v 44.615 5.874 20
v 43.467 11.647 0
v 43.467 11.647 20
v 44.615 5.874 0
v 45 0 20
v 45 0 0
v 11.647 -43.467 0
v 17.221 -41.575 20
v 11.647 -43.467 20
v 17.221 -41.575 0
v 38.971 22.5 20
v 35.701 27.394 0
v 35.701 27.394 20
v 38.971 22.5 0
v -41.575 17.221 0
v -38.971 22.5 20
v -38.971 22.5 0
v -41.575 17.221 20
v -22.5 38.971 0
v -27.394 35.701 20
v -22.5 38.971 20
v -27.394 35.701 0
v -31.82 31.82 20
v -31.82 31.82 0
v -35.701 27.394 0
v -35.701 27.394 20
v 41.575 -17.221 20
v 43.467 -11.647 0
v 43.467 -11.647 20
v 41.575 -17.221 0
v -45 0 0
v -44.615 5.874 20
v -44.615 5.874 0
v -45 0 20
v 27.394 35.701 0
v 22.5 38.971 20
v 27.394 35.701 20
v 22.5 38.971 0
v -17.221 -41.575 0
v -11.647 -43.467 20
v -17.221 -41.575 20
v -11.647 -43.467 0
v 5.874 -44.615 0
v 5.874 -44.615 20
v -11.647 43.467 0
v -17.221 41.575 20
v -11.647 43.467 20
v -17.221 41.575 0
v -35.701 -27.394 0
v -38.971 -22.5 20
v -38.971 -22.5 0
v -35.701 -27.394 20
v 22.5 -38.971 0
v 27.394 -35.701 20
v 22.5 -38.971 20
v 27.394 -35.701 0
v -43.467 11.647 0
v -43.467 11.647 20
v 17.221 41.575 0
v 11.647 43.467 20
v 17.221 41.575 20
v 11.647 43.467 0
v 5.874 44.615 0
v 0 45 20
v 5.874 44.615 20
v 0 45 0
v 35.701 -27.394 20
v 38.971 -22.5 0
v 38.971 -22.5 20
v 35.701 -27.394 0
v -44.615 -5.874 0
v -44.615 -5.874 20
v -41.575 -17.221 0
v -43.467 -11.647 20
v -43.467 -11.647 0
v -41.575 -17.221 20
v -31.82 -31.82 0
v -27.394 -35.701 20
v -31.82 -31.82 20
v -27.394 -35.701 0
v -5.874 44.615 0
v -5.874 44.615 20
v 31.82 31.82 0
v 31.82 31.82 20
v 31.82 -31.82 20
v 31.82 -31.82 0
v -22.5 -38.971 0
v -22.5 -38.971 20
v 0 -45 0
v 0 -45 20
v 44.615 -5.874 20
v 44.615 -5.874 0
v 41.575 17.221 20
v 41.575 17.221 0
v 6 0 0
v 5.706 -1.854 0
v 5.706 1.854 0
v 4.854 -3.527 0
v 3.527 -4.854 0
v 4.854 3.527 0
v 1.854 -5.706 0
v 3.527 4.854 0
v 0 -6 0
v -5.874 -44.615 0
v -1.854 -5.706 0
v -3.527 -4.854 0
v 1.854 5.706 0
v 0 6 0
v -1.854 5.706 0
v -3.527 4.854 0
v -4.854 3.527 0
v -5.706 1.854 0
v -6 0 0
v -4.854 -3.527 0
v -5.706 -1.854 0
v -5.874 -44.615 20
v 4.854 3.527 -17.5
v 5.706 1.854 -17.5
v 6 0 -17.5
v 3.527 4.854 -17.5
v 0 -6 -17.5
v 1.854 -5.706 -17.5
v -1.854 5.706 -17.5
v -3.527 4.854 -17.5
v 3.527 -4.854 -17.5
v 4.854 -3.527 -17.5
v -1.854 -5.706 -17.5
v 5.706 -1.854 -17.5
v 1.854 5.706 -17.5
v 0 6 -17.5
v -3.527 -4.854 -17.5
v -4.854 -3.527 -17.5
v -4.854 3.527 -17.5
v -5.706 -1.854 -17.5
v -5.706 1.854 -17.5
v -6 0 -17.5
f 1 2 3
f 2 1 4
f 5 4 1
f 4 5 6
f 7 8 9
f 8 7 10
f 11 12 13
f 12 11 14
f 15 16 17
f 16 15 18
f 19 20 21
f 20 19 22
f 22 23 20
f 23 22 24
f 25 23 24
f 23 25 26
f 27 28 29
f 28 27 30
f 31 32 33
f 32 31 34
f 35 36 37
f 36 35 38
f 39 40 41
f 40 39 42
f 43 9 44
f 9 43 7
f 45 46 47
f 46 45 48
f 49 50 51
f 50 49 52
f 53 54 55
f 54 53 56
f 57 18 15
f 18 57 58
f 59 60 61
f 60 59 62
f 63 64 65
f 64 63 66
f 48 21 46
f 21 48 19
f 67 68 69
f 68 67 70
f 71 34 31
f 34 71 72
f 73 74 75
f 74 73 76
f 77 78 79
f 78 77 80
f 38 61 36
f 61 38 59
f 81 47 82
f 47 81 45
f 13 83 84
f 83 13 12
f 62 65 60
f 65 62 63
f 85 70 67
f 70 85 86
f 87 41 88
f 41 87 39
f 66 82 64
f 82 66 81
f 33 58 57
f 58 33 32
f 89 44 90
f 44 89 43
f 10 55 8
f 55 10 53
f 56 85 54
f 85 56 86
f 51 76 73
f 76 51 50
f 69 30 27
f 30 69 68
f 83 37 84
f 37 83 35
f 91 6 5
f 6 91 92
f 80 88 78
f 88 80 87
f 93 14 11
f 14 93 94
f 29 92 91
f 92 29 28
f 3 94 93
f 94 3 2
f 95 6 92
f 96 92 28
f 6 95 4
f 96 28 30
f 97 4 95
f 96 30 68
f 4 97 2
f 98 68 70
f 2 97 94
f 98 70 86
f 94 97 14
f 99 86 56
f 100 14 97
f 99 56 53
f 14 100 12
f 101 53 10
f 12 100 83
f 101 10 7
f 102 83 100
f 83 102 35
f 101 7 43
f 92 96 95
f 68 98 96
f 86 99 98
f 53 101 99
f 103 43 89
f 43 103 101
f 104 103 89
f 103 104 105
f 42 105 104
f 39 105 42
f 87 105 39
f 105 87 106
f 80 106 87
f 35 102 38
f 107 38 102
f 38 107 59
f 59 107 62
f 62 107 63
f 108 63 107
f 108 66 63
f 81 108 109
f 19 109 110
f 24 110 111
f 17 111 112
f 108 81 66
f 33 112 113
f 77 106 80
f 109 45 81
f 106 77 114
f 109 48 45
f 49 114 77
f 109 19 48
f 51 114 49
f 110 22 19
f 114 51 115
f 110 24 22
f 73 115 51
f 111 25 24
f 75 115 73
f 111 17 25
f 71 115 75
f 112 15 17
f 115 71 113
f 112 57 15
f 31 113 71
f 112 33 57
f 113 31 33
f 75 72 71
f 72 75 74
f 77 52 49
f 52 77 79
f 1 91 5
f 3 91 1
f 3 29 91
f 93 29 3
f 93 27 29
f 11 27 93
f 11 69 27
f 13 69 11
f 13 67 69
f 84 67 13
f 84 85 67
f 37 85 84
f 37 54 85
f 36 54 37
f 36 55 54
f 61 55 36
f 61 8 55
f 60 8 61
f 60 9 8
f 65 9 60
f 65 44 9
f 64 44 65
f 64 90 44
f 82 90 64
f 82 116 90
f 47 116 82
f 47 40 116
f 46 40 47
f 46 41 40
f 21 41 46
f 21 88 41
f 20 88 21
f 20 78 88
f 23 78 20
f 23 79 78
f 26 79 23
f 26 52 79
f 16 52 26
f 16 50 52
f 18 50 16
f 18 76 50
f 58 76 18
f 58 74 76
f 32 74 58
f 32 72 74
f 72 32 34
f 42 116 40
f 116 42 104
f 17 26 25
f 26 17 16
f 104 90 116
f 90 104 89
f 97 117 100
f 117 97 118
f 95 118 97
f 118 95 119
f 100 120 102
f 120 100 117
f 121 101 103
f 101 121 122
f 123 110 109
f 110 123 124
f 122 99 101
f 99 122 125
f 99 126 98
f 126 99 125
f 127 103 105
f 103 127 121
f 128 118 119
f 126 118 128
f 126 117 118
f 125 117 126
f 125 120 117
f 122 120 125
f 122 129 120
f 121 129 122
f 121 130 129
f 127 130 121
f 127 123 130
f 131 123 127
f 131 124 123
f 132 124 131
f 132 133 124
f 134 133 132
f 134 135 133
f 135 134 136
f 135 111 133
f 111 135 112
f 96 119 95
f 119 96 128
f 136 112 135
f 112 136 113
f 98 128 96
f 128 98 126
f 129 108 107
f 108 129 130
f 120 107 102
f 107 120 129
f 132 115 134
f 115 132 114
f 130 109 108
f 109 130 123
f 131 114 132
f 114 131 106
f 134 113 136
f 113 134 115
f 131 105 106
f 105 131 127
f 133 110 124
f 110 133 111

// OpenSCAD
// Liquid-filled pressure gauge, 3.5" face, 1/4" NPT stem.
face_d = 90;
face_t = 20;
stem_l = 35;
stem_d = 12;
union() {
    cylinder(h = face_t, d = face_d, $fn = 48);
    translate([0, 0, -stem_l / 2])
        cylinder(h = stem_l, d = stem_d, $fn = 20);
}
